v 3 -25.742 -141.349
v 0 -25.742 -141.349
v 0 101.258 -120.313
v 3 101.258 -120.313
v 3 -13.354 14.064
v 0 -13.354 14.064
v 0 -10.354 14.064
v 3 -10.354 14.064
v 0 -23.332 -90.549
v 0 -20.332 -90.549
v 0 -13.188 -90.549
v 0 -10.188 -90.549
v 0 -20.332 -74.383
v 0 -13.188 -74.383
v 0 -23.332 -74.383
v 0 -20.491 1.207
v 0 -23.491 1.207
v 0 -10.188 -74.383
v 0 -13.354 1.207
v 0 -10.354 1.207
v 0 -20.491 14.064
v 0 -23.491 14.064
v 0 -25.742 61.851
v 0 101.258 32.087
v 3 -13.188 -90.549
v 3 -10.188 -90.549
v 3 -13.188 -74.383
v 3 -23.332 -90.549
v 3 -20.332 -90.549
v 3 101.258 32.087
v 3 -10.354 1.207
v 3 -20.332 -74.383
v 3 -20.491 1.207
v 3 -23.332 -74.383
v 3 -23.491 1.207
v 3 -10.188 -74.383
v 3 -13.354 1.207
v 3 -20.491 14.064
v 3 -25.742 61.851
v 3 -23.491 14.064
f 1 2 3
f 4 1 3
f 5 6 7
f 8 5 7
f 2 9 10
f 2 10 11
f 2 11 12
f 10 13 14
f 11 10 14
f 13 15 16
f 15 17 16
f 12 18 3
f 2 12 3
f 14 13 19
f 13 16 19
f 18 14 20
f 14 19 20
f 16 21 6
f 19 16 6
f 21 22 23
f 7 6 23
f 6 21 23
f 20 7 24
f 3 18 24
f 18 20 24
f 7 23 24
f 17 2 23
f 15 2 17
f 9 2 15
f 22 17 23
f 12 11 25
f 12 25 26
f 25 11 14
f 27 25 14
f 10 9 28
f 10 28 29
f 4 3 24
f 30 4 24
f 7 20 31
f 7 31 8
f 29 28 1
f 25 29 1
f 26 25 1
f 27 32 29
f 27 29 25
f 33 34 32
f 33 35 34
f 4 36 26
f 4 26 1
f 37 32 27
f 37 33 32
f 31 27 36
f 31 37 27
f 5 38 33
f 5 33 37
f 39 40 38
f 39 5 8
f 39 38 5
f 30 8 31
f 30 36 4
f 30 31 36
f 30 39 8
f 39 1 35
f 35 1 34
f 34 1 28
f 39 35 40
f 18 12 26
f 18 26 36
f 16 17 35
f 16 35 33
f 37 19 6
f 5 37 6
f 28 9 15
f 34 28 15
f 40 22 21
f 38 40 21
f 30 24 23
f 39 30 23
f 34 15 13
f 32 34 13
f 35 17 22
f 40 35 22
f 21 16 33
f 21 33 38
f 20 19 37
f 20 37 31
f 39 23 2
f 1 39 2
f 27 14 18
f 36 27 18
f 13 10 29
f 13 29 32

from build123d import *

# Parameters (mm, degrees)
F0_W     = 3
F0_H     = 16.165595
F0_H_2   = 12.856834
F1_DEPTH = 3


with BuildPart() as f1:
    # F0 (on Right) → F1 (new body)
    with BuildSketch(Plane.YZ):
        Polygon((101.258113, 32.087279), (-25.741887, 61.851164), (-25.741887, -141.348836), (101.258113, -120.312721), align=None)
        with Locations((-21.8319, -82.466038)):
            Rectangle(F0_W, F0_H, mode=Mode.SUBTRACT)
        with Locations((-11.68815, -82.466038)):
            Rectangle(F0_W, F0_H, mode=Mode.SUBTRACT)
        with Locations((-21.991294, 7.635576)):
            Rectangle(F0_W, F0_H_2, mode=Mode.SUBTRACT)
        with Locations((-11.853894, 7.635576)):
            Rectangle(F0_W, F0_H_2, mode=Mode.SUBTRACT)
    extrude(amount=F1_DEPTH)


solid = f1.part
